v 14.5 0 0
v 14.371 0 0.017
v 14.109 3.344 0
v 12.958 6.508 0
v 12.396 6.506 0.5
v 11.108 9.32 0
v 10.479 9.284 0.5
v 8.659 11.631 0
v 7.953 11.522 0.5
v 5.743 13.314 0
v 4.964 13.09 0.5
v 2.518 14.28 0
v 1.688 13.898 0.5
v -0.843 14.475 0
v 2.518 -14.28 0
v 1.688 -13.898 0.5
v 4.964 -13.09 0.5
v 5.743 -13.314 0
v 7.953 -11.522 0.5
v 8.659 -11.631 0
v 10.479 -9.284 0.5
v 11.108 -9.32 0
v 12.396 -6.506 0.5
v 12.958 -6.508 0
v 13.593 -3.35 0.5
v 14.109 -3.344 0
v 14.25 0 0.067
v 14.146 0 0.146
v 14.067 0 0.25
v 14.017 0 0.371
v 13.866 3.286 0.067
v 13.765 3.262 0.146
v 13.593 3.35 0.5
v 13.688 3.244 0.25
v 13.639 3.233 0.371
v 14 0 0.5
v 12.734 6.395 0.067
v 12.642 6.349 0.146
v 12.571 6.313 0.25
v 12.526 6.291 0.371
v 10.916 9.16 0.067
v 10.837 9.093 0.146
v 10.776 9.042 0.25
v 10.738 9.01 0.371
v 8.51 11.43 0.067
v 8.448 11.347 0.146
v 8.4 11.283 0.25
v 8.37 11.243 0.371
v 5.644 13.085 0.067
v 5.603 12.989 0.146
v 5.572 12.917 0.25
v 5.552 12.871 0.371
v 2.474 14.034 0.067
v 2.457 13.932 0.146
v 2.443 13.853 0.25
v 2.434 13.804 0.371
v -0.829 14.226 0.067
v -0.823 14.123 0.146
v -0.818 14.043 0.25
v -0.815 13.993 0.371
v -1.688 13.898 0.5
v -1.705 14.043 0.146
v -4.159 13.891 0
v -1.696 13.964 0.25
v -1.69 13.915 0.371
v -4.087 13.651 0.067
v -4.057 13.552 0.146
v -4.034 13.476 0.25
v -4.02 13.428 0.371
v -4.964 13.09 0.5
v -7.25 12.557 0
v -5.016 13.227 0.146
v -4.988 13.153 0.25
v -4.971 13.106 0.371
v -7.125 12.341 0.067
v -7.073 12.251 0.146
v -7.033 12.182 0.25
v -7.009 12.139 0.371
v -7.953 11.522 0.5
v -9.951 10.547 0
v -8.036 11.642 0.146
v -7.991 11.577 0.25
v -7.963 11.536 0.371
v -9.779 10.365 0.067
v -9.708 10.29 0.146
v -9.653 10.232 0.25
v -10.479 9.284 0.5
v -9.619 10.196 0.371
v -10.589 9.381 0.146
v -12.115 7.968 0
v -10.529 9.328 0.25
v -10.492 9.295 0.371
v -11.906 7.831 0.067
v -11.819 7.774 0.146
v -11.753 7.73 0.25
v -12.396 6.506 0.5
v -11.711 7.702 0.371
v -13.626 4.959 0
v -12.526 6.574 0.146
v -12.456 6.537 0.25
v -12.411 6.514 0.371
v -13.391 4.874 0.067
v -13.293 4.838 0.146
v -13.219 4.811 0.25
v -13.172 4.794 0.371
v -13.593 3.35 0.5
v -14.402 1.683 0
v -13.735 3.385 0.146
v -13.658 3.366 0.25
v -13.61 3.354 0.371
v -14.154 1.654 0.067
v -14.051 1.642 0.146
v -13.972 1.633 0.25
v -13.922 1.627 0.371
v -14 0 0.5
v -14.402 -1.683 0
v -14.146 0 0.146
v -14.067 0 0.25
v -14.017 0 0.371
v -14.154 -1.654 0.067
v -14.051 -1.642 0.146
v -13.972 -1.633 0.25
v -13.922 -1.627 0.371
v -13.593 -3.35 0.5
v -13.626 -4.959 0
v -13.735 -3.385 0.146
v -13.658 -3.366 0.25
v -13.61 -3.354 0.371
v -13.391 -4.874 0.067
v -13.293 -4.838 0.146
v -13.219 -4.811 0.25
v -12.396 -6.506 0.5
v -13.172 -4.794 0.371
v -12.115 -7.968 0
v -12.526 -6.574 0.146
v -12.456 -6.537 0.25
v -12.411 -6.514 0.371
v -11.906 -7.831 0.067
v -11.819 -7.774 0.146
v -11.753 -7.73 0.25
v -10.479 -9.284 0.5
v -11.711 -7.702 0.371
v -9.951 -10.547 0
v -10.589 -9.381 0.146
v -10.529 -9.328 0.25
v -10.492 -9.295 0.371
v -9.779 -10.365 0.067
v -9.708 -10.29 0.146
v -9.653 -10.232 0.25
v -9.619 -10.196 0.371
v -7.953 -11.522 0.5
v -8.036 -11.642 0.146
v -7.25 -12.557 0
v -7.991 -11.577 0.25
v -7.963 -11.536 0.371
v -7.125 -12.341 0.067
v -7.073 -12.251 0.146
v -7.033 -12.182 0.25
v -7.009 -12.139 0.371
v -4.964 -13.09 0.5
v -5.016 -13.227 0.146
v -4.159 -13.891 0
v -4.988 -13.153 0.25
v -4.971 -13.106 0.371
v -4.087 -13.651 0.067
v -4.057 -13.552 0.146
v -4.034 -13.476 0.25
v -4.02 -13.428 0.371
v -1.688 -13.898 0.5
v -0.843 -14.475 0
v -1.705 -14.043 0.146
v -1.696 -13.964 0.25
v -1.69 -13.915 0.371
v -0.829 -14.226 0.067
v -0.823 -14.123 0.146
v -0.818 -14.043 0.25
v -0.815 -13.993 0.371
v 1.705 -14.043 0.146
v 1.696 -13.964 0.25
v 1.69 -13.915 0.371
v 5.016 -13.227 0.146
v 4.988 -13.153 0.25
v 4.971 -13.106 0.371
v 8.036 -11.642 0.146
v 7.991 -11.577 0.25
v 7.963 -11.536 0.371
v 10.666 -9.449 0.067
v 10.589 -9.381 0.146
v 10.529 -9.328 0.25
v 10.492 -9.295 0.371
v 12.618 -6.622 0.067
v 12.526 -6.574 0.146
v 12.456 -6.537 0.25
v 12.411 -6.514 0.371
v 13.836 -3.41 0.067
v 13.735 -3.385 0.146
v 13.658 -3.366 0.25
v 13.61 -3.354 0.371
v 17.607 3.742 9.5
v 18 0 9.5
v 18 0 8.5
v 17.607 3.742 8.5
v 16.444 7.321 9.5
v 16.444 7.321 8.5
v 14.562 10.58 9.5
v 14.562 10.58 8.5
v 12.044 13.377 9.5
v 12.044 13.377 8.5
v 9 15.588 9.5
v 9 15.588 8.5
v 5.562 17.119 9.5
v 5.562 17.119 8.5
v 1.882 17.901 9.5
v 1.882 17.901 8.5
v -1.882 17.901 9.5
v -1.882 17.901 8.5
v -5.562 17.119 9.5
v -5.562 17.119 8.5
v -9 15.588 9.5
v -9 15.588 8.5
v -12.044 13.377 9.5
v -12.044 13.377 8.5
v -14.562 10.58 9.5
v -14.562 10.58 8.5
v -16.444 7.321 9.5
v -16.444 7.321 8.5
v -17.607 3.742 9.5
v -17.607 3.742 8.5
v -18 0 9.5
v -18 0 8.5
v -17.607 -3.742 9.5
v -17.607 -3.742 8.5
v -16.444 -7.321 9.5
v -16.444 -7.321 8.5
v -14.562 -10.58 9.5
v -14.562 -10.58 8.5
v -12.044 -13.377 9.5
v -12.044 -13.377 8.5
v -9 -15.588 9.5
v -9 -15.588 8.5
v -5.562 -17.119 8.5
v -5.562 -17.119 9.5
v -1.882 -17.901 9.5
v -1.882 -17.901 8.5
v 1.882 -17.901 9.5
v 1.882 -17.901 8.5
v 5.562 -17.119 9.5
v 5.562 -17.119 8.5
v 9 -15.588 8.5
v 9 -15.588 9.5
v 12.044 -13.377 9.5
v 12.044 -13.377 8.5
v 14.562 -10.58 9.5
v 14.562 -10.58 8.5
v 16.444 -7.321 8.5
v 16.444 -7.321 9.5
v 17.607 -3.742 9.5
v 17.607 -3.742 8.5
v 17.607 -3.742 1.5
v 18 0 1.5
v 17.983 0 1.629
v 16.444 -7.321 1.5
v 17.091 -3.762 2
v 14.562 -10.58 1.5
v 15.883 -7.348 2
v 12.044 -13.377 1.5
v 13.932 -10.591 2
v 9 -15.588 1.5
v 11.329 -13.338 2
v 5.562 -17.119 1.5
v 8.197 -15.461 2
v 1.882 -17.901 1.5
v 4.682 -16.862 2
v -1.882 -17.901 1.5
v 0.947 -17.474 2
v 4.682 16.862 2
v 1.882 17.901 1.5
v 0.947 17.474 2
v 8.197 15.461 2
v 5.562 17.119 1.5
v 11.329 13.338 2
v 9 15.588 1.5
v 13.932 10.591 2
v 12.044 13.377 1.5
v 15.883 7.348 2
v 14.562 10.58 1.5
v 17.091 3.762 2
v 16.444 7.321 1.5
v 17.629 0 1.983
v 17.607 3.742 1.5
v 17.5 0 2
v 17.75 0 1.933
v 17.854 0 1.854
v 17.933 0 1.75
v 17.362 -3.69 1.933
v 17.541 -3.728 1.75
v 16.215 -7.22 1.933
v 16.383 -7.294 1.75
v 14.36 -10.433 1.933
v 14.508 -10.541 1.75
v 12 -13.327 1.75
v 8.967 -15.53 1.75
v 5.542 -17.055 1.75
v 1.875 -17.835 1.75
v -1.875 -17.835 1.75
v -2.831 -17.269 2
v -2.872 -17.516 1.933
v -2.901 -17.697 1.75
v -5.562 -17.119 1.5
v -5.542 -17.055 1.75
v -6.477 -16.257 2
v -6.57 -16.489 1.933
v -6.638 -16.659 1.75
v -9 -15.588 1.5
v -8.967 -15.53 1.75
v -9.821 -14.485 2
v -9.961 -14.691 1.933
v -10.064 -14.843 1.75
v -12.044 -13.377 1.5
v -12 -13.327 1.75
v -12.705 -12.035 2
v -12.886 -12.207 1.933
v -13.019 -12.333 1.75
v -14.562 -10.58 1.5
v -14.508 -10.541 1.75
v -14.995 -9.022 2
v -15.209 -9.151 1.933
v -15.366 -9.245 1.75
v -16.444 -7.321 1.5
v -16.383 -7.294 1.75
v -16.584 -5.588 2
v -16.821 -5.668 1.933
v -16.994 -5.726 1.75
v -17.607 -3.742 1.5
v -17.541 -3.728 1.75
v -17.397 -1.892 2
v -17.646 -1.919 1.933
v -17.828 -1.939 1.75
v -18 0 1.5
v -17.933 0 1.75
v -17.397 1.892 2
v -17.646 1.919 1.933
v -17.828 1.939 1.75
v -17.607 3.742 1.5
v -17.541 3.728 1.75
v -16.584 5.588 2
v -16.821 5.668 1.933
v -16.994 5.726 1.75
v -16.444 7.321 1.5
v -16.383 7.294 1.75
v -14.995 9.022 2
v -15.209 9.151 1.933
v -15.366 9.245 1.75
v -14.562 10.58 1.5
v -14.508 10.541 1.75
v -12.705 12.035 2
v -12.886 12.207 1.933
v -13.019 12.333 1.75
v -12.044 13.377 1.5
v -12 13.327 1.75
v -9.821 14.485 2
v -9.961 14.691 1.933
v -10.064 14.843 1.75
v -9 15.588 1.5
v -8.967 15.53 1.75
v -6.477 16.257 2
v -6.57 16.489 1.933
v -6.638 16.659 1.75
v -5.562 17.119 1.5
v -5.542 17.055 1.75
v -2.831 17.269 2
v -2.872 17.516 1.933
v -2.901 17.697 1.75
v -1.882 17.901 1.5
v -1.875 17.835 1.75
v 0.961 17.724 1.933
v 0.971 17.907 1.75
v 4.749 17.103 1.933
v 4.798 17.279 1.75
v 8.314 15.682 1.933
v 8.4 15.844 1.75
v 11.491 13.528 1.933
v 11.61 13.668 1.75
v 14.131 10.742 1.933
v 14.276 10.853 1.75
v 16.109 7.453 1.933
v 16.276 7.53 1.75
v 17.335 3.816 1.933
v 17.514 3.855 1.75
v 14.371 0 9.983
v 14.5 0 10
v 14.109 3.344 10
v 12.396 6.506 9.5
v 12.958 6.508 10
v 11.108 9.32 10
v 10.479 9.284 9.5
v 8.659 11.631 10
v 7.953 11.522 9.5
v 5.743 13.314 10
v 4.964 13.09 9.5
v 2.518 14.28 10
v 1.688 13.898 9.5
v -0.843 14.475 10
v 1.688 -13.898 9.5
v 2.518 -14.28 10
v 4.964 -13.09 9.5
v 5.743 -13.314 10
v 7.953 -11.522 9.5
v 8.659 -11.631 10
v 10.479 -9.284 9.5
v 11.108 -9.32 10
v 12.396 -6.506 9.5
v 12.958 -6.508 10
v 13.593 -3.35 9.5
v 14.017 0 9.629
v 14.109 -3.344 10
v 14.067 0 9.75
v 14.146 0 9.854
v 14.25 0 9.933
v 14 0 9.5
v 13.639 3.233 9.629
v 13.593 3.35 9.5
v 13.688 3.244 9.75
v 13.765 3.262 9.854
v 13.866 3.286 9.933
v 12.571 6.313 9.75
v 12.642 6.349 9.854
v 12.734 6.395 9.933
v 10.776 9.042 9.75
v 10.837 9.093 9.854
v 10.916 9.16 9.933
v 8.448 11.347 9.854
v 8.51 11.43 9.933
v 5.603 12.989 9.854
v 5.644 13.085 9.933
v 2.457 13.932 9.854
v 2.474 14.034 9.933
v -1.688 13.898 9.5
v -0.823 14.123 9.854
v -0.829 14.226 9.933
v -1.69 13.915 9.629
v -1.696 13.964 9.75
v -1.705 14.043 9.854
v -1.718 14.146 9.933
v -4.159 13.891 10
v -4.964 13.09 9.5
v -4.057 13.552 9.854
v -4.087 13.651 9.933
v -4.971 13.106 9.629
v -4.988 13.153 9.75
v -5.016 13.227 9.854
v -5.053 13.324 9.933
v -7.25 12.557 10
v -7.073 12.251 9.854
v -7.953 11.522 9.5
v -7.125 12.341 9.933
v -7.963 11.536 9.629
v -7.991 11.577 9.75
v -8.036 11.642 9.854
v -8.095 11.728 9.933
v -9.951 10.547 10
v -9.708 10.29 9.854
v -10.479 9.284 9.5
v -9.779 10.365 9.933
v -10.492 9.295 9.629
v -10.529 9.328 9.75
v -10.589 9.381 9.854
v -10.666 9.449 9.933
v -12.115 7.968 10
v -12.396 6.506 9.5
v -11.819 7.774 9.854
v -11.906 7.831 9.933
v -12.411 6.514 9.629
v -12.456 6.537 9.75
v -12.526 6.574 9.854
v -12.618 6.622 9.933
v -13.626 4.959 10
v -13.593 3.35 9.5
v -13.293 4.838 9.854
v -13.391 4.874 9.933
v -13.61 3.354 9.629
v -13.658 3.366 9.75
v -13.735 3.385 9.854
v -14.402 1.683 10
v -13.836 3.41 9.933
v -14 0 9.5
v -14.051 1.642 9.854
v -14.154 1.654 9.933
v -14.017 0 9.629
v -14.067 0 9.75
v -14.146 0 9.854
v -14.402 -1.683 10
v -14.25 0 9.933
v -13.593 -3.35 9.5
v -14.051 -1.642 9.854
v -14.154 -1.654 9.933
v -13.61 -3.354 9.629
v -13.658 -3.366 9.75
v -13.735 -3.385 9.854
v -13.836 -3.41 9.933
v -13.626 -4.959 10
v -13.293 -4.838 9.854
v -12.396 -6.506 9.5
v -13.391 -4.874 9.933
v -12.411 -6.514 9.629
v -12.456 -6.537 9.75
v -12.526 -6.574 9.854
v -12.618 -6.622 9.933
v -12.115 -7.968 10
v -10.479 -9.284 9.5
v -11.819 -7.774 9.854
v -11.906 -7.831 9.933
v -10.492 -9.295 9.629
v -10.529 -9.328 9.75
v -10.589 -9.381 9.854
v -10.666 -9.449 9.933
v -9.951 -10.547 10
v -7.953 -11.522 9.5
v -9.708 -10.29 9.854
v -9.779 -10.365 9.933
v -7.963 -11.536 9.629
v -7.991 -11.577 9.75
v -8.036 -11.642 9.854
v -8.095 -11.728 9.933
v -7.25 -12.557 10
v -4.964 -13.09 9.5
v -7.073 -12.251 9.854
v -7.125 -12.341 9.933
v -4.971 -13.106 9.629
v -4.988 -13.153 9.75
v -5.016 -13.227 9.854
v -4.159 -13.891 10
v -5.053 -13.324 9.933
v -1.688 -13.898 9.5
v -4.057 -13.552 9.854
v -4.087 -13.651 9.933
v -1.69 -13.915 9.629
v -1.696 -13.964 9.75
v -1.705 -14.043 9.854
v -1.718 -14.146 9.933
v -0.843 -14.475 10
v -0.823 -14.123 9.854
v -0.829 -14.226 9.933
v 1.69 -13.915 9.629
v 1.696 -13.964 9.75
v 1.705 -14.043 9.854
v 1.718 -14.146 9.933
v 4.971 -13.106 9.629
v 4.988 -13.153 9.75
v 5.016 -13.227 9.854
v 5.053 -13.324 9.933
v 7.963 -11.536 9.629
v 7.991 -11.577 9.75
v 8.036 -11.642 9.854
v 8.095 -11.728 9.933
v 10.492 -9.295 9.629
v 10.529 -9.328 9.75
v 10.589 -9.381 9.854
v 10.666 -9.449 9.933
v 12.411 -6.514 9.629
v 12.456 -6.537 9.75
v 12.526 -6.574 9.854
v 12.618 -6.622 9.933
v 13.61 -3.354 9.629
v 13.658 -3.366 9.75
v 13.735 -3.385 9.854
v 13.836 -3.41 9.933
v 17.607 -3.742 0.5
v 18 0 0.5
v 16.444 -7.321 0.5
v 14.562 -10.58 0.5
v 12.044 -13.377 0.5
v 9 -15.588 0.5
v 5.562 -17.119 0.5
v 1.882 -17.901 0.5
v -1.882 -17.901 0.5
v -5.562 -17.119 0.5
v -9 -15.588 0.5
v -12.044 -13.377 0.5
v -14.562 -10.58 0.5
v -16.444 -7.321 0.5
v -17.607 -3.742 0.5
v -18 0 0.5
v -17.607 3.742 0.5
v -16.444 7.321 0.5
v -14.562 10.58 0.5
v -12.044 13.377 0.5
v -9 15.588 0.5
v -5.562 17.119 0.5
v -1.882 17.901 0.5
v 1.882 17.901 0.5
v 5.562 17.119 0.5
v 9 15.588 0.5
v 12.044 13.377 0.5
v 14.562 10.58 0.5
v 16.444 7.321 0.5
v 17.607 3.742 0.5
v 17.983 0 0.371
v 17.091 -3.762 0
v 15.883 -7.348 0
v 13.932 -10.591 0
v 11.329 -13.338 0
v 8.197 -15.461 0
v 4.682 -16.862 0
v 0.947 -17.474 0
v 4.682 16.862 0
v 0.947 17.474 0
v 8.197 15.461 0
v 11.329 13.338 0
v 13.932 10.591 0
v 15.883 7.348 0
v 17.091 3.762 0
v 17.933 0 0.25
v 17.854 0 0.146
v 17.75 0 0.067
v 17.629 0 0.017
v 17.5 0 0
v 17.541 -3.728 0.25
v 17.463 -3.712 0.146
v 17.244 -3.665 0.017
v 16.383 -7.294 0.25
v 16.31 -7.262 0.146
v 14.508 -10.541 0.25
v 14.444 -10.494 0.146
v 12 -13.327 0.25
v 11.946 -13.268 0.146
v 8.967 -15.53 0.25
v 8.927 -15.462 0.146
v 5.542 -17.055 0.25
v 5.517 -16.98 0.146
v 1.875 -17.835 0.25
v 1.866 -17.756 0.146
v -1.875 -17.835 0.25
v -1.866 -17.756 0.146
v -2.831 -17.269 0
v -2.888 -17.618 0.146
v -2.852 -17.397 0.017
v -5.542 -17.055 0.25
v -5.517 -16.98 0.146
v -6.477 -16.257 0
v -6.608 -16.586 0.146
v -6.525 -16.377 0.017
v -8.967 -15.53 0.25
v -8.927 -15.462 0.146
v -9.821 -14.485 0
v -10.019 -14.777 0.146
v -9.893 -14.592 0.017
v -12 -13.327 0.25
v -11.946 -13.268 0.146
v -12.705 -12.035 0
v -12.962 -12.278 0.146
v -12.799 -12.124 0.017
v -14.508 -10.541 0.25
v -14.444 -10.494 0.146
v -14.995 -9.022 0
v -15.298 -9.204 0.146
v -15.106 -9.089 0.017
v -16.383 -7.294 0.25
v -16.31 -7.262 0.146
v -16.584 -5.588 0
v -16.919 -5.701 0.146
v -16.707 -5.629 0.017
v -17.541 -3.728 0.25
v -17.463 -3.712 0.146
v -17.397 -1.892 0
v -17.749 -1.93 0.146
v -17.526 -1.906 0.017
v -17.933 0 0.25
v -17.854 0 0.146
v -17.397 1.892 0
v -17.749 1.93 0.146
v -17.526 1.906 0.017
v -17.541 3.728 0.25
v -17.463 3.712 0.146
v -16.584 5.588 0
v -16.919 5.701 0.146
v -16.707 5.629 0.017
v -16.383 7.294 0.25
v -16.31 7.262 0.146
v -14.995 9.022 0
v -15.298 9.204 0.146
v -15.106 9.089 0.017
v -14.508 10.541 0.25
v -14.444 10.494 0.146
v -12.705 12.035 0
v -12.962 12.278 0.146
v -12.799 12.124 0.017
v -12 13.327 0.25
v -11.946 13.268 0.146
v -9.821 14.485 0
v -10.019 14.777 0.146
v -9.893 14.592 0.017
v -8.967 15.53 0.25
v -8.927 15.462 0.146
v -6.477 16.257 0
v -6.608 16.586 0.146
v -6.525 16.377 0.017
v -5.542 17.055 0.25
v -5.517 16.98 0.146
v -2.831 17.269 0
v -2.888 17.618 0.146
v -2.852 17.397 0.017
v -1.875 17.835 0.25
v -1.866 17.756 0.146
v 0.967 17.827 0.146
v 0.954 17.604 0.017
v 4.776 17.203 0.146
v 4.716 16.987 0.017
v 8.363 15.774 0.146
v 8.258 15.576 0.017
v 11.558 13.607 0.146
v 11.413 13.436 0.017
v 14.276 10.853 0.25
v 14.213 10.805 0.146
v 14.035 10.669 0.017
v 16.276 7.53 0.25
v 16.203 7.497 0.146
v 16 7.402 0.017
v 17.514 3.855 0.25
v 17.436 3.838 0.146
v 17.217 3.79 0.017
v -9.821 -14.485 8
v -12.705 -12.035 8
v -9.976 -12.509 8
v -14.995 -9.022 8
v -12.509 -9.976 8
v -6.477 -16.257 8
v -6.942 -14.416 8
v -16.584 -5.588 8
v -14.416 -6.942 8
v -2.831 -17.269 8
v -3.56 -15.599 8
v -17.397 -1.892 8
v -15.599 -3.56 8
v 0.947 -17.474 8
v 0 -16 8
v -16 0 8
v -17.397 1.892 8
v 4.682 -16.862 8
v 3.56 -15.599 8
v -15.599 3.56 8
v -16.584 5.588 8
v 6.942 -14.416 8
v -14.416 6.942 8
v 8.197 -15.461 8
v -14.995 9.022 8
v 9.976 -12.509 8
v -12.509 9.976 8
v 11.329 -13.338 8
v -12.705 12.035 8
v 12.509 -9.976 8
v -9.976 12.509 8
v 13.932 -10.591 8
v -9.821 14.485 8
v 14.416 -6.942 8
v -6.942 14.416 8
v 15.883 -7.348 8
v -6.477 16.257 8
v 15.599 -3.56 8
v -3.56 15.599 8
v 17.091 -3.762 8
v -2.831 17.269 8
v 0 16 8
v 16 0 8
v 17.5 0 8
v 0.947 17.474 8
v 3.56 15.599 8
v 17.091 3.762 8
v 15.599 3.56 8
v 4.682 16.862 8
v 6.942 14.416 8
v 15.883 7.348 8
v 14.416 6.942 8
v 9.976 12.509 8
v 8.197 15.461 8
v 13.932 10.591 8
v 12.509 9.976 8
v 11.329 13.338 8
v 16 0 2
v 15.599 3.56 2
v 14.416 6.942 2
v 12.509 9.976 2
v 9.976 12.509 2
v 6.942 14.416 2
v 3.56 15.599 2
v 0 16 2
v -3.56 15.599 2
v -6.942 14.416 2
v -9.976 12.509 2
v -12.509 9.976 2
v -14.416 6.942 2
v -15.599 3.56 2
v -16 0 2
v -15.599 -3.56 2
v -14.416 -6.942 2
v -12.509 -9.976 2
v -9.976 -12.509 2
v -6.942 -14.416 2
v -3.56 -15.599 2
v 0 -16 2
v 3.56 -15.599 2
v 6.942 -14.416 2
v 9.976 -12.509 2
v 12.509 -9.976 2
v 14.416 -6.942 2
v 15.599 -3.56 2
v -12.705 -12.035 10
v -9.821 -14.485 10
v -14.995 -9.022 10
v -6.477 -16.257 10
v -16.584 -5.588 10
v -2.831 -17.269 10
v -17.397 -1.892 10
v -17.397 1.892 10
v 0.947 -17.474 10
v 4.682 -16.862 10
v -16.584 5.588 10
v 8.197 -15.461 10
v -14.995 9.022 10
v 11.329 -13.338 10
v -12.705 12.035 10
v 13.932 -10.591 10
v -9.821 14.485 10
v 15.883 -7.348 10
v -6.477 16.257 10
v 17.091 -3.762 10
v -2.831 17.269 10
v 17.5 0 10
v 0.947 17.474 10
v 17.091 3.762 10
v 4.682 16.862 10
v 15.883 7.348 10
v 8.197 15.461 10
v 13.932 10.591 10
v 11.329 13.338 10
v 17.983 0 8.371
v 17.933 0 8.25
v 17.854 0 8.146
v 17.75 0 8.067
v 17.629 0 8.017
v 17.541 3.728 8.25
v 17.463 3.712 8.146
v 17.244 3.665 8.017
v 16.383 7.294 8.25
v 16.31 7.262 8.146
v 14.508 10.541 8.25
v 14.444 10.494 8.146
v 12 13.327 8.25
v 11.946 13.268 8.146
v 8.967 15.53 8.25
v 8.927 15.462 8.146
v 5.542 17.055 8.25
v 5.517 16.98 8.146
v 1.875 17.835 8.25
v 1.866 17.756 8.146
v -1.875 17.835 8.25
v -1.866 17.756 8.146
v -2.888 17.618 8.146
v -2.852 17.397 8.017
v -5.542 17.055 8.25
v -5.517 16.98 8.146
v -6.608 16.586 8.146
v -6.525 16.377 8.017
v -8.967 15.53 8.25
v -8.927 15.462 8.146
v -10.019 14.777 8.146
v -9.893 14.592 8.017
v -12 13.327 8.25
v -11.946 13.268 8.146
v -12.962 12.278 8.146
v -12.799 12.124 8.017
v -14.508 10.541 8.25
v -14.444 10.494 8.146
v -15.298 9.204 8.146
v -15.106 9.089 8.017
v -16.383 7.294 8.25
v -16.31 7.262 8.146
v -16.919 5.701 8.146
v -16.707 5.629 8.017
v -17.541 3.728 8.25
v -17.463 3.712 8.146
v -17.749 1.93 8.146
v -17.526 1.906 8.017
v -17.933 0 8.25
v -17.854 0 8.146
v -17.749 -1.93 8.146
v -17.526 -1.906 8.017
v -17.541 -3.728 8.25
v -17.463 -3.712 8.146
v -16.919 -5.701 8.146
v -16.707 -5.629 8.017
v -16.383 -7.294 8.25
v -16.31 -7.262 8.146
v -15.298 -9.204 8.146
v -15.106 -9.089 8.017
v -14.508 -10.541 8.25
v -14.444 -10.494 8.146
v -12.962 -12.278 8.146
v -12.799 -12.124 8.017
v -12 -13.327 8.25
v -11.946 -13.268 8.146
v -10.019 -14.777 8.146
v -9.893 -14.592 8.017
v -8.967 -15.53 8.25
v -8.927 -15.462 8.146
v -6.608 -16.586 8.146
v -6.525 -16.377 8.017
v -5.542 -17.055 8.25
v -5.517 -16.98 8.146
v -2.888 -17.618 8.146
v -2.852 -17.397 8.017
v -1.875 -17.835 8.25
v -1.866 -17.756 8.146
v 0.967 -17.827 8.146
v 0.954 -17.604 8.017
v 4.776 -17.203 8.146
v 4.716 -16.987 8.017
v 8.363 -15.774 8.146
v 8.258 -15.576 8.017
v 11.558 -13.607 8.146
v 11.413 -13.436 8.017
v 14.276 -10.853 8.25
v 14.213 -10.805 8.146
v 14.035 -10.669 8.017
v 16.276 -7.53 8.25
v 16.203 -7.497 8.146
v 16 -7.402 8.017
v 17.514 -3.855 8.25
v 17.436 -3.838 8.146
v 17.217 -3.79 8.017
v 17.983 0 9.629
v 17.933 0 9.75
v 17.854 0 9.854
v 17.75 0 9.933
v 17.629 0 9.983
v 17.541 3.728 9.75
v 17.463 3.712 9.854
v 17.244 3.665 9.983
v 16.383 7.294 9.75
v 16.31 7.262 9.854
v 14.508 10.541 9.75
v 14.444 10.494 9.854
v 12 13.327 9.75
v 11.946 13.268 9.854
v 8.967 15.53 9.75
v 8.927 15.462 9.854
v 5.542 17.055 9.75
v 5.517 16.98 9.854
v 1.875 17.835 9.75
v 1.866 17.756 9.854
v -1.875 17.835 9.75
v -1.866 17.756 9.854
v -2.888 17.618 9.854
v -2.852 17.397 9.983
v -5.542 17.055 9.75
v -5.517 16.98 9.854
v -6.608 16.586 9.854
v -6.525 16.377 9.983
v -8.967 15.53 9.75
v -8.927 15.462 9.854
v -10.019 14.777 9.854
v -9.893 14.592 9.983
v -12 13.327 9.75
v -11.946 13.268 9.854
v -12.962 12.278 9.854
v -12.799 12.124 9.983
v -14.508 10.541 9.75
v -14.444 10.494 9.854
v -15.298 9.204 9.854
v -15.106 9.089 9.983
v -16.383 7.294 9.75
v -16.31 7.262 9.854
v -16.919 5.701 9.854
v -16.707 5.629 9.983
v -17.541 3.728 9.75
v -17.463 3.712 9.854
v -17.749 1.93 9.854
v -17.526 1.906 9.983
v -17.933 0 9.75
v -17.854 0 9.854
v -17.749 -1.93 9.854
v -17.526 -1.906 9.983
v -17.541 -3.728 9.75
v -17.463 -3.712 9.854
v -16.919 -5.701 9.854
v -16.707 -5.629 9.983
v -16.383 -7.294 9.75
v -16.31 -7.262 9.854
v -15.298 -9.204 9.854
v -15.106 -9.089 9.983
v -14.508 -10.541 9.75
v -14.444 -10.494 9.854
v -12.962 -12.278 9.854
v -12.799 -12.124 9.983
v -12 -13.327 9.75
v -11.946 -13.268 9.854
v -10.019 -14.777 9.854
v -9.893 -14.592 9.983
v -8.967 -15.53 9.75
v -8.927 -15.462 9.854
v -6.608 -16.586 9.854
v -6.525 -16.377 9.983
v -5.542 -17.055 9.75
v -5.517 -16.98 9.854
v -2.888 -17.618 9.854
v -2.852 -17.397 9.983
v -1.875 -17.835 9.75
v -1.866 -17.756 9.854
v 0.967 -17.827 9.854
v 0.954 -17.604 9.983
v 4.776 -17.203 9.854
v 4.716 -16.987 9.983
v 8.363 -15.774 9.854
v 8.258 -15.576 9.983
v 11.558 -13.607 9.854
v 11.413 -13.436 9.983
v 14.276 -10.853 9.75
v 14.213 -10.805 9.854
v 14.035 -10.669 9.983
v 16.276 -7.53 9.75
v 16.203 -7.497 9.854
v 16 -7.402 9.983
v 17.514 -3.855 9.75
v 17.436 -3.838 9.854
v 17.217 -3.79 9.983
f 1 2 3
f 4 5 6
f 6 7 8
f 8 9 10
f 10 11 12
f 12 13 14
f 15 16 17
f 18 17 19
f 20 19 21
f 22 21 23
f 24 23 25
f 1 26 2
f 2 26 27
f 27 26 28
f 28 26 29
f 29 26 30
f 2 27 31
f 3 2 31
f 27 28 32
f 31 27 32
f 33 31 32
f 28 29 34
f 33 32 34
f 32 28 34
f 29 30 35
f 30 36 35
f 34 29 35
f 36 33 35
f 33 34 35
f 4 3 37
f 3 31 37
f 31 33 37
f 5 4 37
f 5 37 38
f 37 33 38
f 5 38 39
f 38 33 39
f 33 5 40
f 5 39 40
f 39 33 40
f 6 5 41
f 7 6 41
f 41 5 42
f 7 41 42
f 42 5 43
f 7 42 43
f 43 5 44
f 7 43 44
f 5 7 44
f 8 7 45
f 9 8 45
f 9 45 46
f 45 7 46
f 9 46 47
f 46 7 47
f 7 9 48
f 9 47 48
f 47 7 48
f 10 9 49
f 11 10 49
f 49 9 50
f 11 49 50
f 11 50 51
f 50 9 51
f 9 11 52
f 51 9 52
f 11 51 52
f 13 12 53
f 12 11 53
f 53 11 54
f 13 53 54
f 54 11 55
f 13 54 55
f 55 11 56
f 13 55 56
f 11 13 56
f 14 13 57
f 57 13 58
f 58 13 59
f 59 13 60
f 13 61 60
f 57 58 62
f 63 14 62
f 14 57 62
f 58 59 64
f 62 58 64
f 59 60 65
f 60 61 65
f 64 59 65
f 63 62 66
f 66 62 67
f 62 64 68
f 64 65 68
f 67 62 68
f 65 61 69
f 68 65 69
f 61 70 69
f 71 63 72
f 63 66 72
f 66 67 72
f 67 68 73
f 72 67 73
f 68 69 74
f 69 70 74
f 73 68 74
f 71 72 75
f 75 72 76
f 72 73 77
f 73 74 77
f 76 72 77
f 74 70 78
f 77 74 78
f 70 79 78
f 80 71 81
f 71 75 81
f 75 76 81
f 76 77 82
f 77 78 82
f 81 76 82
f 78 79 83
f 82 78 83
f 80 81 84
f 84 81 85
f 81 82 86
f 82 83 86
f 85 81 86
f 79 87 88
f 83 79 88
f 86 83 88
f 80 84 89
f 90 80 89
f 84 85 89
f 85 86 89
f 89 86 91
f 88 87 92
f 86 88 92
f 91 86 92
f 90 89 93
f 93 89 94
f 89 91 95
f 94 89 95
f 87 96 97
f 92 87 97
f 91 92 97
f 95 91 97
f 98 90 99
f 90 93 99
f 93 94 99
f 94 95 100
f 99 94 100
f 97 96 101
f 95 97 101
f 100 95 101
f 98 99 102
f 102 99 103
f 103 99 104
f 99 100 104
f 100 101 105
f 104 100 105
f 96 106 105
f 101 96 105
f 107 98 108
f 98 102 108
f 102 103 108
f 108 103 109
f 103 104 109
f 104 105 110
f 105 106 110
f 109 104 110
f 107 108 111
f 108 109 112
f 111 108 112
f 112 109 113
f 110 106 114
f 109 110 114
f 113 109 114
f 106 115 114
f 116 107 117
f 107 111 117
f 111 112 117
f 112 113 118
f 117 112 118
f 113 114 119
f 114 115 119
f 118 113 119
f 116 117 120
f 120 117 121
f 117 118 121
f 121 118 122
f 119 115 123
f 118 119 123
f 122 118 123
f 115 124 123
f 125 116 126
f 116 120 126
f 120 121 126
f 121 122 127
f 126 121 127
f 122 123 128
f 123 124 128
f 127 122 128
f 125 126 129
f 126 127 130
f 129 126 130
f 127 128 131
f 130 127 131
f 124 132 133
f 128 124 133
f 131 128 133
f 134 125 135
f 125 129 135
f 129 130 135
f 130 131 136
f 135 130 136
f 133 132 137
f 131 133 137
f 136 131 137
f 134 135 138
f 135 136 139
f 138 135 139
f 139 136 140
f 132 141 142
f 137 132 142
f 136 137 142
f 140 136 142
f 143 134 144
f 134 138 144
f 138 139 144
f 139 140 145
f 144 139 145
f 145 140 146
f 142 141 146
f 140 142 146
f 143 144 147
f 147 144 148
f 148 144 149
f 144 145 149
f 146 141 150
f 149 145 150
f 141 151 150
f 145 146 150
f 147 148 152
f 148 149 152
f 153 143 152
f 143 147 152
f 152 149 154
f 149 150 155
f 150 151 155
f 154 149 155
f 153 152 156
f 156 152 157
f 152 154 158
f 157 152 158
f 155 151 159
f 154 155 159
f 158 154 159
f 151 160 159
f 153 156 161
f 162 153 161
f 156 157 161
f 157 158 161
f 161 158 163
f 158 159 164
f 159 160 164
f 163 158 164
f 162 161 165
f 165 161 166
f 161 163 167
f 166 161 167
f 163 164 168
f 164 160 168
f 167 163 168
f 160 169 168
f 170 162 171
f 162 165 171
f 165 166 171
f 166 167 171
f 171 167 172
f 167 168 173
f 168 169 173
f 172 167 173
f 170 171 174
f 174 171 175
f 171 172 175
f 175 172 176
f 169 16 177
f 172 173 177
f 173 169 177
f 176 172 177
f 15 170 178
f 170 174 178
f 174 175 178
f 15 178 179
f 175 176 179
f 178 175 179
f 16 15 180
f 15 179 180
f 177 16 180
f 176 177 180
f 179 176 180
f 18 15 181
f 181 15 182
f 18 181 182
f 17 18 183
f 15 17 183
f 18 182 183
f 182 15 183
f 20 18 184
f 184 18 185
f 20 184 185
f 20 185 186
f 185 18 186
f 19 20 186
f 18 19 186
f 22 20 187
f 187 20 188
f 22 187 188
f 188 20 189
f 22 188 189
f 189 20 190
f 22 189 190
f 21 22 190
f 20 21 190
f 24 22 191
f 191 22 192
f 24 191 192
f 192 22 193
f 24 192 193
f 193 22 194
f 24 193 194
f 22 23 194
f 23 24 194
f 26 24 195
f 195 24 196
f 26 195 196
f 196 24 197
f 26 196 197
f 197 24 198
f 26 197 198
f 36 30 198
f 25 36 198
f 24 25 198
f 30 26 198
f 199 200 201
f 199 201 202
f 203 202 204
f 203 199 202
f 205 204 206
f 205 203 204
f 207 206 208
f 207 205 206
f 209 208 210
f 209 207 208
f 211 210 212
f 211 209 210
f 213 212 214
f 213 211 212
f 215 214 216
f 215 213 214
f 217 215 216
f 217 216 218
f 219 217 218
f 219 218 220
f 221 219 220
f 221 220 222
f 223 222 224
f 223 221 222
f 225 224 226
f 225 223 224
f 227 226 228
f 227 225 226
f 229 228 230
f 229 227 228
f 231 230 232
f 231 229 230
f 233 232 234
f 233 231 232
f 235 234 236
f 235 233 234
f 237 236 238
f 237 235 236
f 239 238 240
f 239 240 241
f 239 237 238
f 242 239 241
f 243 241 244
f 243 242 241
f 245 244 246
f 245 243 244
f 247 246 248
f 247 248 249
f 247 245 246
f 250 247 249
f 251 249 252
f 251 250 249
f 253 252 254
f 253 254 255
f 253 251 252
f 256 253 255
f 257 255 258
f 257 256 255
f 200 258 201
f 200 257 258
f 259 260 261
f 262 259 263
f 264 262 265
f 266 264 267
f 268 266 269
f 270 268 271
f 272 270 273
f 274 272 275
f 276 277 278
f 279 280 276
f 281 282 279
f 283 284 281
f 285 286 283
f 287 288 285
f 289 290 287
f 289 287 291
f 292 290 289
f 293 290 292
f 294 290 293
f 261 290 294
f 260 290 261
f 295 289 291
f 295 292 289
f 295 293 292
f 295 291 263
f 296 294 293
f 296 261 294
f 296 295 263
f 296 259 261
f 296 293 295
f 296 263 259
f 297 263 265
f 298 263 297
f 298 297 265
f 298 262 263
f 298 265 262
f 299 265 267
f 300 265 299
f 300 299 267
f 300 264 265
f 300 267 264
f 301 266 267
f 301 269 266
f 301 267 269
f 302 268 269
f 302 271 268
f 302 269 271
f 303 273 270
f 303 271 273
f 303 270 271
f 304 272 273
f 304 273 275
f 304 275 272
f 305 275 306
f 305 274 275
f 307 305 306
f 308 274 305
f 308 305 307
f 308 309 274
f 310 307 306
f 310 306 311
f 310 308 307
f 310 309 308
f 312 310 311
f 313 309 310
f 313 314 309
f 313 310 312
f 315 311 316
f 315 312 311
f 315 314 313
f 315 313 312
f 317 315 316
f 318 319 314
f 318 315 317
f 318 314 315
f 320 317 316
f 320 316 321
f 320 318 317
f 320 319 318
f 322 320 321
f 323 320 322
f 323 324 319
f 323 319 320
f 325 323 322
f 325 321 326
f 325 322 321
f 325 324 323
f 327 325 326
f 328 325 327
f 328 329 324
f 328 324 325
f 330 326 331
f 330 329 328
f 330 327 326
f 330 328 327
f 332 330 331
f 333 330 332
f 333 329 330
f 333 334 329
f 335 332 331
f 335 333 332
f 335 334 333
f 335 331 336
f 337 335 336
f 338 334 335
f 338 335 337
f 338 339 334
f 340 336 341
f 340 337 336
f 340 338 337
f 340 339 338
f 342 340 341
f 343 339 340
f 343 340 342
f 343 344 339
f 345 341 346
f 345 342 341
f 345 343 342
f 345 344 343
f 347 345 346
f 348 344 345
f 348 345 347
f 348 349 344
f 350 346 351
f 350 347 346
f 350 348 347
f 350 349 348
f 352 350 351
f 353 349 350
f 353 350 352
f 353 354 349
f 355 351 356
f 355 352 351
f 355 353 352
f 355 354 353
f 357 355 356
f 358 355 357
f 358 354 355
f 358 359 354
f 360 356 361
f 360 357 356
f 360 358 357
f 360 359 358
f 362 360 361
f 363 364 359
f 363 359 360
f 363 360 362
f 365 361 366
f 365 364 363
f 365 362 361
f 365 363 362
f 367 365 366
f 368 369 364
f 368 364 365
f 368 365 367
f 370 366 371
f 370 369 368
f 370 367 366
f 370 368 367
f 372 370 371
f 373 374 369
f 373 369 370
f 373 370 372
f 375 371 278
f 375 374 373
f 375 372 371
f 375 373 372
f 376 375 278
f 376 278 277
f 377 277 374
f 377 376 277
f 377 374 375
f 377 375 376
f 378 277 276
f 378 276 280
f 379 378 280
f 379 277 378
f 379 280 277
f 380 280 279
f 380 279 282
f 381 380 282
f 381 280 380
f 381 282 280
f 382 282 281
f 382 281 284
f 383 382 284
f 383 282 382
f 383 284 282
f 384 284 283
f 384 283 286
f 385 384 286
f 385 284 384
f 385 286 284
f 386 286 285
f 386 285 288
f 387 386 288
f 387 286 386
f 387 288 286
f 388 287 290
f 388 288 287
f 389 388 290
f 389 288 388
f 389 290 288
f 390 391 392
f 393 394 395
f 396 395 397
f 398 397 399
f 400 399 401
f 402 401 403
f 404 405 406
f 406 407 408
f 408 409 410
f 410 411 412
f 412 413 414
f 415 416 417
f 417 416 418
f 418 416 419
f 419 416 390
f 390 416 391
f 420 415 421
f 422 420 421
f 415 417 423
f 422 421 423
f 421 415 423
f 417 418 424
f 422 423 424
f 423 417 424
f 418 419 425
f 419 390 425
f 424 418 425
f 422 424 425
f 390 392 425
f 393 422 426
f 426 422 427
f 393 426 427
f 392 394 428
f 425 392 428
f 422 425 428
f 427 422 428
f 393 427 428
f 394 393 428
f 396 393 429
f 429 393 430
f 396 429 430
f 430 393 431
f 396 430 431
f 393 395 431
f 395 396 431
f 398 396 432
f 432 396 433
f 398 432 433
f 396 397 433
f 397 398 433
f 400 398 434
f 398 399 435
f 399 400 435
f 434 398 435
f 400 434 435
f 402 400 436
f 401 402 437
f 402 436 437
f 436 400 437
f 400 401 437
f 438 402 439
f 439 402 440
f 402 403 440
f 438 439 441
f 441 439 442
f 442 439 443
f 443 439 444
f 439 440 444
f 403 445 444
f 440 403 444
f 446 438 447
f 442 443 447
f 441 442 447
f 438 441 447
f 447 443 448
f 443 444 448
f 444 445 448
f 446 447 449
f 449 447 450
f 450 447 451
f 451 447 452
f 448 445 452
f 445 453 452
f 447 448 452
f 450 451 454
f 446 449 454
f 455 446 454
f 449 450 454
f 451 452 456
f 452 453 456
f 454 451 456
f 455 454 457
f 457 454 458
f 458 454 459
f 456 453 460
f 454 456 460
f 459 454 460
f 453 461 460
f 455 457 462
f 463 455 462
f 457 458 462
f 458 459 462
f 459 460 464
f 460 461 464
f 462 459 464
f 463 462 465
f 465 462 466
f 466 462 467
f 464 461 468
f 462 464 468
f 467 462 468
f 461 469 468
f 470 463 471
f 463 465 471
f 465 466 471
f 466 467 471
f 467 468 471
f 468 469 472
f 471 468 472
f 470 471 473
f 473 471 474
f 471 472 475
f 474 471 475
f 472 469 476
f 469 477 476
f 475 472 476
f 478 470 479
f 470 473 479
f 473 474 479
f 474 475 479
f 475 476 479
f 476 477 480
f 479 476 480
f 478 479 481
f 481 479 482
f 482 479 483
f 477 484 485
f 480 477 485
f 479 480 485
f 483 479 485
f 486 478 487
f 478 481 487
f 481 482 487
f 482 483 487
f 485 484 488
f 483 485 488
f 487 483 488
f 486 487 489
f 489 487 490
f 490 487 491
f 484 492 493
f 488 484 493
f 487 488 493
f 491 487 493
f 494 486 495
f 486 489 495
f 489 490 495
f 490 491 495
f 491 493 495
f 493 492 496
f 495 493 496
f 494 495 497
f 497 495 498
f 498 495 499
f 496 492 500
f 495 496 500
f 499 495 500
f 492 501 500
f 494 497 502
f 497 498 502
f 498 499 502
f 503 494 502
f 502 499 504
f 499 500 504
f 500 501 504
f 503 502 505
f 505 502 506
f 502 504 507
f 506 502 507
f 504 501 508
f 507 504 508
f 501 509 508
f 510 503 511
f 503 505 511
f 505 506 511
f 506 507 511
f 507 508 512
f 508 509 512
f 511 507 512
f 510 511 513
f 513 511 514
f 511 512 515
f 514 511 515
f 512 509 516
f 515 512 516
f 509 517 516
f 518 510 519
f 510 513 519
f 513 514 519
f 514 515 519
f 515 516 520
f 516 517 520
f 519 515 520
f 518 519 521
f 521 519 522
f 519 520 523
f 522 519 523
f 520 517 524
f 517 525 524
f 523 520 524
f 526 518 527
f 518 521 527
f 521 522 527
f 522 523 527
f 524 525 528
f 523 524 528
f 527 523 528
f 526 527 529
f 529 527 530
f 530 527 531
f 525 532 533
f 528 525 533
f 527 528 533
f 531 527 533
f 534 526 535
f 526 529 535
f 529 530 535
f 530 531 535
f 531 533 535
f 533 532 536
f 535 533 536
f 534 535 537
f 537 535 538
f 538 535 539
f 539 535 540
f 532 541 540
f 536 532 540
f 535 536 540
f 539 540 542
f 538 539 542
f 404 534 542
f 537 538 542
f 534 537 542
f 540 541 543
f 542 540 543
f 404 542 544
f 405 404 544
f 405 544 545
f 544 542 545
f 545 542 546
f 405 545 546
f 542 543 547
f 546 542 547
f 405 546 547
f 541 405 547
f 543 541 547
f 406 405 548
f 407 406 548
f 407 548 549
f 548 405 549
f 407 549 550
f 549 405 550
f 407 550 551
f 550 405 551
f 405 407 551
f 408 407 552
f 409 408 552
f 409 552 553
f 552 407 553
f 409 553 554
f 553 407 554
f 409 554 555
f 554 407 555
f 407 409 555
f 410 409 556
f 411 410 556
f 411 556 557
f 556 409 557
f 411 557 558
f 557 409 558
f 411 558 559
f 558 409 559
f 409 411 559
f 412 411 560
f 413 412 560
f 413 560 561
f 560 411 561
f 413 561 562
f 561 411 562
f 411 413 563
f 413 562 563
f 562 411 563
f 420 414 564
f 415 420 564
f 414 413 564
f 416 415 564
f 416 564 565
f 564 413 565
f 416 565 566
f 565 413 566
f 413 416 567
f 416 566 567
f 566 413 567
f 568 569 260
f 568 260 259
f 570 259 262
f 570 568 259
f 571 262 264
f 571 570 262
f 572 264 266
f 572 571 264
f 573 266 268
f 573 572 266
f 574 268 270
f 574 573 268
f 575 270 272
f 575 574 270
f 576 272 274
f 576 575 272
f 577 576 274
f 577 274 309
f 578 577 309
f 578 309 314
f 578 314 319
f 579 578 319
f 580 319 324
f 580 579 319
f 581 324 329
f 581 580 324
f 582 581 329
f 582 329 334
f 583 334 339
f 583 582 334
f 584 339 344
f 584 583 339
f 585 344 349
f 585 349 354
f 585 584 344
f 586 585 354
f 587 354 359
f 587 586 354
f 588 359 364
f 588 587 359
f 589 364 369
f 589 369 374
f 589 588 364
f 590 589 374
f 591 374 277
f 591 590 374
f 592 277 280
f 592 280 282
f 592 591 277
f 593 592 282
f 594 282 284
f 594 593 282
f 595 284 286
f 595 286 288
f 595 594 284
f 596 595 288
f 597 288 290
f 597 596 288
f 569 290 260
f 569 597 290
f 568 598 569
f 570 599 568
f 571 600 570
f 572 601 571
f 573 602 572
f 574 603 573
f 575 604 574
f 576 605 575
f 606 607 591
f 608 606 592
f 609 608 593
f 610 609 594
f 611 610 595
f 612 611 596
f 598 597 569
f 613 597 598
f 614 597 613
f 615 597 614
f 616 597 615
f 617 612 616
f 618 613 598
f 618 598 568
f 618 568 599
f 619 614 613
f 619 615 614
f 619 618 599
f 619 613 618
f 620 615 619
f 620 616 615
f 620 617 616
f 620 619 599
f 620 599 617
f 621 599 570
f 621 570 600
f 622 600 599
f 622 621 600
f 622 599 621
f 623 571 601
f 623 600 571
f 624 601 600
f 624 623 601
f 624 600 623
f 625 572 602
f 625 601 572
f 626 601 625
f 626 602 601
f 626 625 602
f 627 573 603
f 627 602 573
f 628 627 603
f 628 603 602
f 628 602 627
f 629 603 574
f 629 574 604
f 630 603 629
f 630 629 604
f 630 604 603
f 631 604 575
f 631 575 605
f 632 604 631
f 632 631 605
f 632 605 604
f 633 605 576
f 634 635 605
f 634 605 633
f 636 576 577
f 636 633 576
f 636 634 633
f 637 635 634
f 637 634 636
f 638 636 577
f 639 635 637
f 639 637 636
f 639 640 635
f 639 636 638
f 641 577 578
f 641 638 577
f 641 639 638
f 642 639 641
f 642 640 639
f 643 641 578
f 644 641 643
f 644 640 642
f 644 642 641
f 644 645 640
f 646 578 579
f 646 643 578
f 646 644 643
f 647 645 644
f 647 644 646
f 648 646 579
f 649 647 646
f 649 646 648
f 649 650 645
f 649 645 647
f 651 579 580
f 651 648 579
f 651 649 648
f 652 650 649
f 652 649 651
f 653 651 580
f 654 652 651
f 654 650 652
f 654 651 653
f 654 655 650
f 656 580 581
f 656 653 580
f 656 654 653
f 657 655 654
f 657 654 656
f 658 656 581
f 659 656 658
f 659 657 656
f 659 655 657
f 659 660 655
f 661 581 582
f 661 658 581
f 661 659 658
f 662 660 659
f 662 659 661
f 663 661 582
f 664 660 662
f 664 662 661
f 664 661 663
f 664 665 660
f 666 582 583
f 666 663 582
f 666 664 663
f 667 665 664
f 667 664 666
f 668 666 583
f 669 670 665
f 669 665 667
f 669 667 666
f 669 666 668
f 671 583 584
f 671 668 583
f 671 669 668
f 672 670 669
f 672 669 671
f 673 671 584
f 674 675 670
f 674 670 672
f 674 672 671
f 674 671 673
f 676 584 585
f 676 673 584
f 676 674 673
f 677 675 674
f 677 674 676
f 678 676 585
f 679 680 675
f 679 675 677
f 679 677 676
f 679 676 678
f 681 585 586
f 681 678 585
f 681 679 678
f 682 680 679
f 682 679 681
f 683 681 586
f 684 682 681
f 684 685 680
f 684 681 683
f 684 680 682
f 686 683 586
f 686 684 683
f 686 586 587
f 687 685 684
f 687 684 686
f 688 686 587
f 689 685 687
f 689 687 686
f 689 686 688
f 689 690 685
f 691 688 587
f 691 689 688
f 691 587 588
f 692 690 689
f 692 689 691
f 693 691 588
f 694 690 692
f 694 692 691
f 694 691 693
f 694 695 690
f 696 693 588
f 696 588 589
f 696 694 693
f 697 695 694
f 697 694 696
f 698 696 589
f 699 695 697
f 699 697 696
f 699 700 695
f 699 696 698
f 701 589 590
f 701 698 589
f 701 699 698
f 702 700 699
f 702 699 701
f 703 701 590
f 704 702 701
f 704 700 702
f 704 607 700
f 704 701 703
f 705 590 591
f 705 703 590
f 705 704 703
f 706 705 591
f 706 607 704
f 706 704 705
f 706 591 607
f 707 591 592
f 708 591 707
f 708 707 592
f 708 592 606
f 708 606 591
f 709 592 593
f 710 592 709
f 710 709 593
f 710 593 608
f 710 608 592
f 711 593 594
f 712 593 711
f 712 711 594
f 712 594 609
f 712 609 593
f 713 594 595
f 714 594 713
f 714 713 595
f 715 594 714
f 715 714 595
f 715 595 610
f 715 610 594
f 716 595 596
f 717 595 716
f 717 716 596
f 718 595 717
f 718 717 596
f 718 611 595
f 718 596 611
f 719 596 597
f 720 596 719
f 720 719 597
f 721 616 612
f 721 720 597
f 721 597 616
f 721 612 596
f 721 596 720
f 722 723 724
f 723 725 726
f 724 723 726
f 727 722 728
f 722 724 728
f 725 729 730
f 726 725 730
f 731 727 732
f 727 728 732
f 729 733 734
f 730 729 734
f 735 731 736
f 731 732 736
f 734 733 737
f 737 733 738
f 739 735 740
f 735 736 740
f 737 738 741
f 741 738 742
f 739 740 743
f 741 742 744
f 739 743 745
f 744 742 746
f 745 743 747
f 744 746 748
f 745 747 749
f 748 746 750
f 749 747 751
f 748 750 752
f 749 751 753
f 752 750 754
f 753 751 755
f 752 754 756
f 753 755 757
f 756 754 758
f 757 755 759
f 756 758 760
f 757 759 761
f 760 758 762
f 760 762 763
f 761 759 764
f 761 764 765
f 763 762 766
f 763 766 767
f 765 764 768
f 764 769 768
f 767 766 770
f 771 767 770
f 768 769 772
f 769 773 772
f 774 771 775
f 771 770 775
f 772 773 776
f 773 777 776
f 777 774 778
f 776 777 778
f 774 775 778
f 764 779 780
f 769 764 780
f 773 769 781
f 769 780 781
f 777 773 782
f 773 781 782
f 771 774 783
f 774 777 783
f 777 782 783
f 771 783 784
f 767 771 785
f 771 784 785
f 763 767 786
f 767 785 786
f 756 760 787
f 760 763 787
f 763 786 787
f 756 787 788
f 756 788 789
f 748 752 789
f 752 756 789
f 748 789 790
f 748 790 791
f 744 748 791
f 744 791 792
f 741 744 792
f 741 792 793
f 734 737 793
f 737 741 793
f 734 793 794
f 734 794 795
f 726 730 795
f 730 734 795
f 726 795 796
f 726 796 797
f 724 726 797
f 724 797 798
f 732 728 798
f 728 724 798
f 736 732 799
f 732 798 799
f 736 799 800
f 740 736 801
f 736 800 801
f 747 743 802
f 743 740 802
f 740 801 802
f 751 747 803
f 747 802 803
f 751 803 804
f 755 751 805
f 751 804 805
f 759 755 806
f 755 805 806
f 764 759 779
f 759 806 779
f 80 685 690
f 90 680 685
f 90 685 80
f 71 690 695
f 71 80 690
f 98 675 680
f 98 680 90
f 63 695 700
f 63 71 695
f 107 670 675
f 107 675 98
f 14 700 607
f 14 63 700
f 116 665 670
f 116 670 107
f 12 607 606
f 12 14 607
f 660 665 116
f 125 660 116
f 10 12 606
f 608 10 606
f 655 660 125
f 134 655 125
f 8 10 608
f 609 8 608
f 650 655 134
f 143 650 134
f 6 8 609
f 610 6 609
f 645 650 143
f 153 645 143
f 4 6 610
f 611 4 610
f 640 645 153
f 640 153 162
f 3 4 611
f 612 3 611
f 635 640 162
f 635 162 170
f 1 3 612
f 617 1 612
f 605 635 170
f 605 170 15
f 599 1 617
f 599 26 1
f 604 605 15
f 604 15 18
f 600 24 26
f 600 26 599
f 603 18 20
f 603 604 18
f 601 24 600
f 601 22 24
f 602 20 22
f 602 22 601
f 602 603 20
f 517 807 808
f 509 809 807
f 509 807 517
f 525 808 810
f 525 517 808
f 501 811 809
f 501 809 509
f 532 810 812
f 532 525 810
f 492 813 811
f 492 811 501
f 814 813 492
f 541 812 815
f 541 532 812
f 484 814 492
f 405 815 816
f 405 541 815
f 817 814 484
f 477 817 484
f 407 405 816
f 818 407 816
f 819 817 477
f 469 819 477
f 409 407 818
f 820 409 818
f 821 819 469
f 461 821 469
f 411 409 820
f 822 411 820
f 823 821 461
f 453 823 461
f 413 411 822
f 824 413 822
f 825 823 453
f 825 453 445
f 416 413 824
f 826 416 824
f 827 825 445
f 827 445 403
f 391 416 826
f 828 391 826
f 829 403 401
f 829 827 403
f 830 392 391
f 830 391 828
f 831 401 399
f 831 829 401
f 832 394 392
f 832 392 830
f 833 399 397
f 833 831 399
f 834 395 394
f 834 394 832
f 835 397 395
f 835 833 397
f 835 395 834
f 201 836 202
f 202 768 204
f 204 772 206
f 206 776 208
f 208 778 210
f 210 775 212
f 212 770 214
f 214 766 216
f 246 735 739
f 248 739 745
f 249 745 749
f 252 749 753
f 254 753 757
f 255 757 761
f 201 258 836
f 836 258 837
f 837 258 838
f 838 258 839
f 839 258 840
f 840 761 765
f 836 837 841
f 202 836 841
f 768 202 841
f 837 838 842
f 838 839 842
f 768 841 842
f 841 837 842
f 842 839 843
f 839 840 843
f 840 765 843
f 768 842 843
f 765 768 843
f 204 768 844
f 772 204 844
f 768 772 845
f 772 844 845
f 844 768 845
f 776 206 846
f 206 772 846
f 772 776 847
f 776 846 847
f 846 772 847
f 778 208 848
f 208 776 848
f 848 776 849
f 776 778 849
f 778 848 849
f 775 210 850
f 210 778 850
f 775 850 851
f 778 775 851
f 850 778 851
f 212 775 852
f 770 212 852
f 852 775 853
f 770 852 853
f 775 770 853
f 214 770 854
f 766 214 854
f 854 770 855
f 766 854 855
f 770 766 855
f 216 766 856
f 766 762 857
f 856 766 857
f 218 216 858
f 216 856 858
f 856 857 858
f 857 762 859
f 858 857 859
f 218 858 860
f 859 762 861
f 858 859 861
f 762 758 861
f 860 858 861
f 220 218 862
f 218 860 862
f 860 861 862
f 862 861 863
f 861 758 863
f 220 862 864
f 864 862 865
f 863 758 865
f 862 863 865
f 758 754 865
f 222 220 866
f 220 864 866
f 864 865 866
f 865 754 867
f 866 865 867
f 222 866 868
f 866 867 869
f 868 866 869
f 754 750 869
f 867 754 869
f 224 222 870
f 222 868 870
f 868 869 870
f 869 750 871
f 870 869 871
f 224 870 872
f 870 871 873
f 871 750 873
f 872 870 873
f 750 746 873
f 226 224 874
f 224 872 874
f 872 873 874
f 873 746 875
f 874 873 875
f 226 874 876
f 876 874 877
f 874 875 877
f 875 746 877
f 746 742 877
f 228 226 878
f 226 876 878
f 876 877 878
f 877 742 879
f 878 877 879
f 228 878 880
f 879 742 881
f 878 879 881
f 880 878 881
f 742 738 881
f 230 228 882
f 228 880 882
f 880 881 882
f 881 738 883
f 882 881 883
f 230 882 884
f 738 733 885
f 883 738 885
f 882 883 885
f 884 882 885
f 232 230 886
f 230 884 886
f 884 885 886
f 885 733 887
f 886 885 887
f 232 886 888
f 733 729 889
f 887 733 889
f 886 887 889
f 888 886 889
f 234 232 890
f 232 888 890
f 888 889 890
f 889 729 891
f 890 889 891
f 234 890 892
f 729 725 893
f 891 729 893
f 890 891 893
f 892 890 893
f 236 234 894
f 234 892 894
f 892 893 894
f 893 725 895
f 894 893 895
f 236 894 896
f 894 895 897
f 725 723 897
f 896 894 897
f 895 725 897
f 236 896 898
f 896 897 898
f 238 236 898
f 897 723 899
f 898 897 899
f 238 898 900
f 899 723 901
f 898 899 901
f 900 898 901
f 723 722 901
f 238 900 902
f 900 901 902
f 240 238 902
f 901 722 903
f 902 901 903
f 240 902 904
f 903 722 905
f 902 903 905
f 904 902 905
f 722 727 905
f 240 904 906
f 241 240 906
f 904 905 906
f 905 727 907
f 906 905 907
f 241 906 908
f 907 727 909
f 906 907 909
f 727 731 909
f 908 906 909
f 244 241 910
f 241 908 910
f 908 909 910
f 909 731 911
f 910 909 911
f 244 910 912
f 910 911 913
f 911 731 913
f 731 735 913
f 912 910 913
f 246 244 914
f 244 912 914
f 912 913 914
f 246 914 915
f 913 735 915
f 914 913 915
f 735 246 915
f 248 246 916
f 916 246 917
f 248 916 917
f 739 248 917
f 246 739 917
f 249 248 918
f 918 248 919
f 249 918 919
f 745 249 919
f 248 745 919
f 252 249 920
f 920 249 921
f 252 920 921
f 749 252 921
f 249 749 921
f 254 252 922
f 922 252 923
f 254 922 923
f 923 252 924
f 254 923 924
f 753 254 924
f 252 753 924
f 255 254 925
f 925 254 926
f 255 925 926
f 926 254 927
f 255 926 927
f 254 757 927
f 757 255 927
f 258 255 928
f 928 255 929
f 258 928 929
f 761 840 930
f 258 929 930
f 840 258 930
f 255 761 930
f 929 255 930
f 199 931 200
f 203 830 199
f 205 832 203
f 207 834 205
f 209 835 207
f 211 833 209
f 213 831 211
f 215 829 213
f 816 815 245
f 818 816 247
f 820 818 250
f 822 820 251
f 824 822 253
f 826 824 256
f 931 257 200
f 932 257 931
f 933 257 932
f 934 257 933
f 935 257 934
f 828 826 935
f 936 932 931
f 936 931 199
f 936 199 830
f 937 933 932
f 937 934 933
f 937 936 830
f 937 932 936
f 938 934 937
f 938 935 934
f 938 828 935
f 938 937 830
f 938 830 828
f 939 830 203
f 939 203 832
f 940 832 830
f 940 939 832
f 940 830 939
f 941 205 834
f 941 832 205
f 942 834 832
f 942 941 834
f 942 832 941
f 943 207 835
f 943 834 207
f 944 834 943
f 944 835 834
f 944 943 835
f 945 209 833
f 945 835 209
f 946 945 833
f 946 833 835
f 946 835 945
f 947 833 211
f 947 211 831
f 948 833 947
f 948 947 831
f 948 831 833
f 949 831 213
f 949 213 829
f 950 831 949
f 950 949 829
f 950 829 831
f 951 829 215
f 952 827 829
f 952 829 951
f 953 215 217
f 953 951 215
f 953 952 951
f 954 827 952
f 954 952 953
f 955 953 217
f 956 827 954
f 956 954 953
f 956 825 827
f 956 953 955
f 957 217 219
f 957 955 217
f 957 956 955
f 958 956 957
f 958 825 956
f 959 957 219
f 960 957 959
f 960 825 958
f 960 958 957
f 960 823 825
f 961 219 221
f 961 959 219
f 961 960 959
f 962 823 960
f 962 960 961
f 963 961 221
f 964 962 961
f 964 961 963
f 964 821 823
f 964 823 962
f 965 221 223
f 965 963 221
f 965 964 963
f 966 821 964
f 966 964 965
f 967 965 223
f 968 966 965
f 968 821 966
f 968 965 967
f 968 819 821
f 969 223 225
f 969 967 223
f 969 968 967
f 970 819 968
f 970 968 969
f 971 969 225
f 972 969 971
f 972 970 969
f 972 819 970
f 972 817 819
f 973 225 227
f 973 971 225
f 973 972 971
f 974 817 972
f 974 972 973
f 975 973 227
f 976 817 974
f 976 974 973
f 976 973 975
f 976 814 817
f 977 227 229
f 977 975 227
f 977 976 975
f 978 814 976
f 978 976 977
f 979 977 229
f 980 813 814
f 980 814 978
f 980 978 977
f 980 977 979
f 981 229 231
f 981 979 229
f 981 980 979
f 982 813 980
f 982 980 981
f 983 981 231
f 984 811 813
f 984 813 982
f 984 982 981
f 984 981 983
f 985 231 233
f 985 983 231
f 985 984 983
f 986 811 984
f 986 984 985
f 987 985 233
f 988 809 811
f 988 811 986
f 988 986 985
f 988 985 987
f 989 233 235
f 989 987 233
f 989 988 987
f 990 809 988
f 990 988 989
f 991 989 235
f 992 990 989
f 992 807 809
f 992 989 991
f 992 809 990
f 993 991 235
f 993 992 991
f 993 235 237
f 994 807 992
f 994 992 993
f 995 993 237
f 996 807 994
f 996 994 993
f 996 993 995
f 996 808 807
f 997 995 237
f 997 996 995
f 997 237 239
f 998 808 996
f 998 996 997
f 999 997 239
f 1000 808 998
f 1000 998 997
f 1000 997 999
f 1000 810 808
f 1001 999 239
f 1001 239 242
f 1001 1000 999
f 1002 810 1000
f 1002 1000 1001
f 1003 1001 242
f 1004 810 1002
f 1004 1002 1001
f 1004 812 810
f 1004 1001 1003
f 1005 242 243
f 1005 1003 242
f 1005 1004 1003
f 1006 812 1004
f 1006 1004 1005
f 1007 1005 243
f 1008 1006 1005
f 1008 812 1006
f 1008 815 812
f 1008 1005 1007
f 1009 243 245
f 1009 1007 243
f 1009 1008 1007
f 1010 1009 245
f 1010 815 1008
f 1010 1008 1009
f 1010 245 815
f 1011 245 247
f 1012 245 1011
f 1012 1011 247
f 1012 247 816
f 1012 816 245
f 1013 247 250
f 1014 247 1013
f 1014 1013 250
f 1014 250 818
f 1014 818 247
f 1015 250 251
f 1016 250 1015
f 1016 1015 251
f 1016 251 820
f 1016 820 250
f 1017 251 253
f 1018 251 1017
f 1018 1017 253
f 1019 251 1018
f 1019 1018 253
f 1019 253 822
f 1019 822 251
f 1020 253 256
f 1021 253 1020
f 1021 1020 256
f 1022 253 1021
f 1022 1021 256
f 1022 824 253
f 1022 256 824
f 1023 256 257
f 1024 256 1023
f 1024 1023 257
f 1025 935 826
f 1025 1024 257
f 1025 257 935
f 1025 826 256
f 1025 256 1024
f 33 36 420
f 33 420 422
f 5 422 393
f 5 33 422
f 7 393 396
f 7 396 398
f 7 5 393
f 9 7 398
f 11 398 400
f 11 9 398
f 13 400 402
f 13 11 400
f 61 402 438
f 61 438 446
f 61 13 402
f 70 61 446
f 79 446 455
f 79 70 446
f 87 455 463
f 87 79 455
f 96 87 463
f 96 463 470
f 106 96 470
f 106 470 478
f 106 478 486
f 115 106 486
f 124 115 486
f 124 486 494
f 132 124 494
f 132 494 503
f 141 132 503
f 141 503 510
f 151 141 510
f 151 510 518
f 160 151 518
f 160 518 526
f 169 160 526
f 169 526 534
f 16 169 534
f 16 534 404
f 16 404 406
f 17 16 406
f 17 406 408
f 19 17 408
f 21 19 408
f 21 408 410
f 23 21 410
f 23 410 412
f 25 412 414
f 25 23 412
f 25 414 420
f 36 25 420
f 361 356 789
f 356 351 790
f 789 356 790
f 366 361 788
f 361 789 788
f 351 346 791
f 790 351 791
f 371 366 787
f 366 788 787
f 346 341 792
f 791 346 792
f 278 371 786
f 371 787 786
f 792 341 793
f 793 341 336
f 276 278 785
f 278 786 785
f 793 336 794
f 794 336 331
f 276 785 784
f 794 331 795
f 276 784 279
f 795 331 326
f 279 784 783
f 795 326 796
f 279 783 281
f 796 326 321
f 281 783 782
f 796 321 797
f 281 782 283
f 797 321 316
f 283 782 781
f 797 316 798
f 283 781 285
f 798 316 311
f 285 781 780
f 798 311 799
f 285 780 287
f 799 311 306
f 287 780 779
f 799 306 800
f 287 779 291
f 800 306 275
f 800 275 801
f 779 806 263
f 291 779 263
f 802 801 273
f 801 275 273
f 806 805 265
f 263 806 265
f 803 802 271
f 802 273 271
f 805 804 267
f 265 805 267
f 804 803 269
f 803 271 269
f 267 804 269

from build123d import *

# Parameters (mm, degrees)
F0_R     = 16
F0_R_2   = 14
F1_DEPTH = 10
F2_R     = 18
F2_R_2   = 16
F3_DEPTH = 2
F4_R     = 18
F4_R_2   = 14
F5_DEPTH = 2
F6_R     = 0.5


with BuildPart() as f1:
    # F0 (on Top) → F1 (new body)
    with BuildSketch(Plane.XY):
        Circle(F0_R)
        Circle(F0_R_2, mode=Mode.SUBTRACT)
    extrude(amount=F1_DEPTH)

    # F2 (on face) → F3 (join)
    with BuildSketch(Plane(origin=(0, 0, 0), x_dir=(1, 0, 0), z_dir=(0, 0, -1))):
        Circle(F2_R)
        Circle(F2_R_2, mode=Mode.SUBTRACT)
    extrude(amount=-F3_DEPTH)

    # F4 (on face) → F5 (join)
    with BuildSketch(Plane.XY.offset(10)):
        Circle(F4_R)
        Circle(F4_R_2, mode=Mode.SUBTRACT)
    extrude(amount=-F5_DEPTH)

    # F6
    f6_edges = [f1.edges().sort_by_distance(p)[0] for p in [
        (-18, 0, 10),
        (-18, 0, 0),
        (-18, 0, 8),
        (-18, 0, 2),
        (-14, 0, 0),
        (-14, 0, 10),
    ]]
    fillet(f6_edges, radius=F6_R)


solid = f1.part
